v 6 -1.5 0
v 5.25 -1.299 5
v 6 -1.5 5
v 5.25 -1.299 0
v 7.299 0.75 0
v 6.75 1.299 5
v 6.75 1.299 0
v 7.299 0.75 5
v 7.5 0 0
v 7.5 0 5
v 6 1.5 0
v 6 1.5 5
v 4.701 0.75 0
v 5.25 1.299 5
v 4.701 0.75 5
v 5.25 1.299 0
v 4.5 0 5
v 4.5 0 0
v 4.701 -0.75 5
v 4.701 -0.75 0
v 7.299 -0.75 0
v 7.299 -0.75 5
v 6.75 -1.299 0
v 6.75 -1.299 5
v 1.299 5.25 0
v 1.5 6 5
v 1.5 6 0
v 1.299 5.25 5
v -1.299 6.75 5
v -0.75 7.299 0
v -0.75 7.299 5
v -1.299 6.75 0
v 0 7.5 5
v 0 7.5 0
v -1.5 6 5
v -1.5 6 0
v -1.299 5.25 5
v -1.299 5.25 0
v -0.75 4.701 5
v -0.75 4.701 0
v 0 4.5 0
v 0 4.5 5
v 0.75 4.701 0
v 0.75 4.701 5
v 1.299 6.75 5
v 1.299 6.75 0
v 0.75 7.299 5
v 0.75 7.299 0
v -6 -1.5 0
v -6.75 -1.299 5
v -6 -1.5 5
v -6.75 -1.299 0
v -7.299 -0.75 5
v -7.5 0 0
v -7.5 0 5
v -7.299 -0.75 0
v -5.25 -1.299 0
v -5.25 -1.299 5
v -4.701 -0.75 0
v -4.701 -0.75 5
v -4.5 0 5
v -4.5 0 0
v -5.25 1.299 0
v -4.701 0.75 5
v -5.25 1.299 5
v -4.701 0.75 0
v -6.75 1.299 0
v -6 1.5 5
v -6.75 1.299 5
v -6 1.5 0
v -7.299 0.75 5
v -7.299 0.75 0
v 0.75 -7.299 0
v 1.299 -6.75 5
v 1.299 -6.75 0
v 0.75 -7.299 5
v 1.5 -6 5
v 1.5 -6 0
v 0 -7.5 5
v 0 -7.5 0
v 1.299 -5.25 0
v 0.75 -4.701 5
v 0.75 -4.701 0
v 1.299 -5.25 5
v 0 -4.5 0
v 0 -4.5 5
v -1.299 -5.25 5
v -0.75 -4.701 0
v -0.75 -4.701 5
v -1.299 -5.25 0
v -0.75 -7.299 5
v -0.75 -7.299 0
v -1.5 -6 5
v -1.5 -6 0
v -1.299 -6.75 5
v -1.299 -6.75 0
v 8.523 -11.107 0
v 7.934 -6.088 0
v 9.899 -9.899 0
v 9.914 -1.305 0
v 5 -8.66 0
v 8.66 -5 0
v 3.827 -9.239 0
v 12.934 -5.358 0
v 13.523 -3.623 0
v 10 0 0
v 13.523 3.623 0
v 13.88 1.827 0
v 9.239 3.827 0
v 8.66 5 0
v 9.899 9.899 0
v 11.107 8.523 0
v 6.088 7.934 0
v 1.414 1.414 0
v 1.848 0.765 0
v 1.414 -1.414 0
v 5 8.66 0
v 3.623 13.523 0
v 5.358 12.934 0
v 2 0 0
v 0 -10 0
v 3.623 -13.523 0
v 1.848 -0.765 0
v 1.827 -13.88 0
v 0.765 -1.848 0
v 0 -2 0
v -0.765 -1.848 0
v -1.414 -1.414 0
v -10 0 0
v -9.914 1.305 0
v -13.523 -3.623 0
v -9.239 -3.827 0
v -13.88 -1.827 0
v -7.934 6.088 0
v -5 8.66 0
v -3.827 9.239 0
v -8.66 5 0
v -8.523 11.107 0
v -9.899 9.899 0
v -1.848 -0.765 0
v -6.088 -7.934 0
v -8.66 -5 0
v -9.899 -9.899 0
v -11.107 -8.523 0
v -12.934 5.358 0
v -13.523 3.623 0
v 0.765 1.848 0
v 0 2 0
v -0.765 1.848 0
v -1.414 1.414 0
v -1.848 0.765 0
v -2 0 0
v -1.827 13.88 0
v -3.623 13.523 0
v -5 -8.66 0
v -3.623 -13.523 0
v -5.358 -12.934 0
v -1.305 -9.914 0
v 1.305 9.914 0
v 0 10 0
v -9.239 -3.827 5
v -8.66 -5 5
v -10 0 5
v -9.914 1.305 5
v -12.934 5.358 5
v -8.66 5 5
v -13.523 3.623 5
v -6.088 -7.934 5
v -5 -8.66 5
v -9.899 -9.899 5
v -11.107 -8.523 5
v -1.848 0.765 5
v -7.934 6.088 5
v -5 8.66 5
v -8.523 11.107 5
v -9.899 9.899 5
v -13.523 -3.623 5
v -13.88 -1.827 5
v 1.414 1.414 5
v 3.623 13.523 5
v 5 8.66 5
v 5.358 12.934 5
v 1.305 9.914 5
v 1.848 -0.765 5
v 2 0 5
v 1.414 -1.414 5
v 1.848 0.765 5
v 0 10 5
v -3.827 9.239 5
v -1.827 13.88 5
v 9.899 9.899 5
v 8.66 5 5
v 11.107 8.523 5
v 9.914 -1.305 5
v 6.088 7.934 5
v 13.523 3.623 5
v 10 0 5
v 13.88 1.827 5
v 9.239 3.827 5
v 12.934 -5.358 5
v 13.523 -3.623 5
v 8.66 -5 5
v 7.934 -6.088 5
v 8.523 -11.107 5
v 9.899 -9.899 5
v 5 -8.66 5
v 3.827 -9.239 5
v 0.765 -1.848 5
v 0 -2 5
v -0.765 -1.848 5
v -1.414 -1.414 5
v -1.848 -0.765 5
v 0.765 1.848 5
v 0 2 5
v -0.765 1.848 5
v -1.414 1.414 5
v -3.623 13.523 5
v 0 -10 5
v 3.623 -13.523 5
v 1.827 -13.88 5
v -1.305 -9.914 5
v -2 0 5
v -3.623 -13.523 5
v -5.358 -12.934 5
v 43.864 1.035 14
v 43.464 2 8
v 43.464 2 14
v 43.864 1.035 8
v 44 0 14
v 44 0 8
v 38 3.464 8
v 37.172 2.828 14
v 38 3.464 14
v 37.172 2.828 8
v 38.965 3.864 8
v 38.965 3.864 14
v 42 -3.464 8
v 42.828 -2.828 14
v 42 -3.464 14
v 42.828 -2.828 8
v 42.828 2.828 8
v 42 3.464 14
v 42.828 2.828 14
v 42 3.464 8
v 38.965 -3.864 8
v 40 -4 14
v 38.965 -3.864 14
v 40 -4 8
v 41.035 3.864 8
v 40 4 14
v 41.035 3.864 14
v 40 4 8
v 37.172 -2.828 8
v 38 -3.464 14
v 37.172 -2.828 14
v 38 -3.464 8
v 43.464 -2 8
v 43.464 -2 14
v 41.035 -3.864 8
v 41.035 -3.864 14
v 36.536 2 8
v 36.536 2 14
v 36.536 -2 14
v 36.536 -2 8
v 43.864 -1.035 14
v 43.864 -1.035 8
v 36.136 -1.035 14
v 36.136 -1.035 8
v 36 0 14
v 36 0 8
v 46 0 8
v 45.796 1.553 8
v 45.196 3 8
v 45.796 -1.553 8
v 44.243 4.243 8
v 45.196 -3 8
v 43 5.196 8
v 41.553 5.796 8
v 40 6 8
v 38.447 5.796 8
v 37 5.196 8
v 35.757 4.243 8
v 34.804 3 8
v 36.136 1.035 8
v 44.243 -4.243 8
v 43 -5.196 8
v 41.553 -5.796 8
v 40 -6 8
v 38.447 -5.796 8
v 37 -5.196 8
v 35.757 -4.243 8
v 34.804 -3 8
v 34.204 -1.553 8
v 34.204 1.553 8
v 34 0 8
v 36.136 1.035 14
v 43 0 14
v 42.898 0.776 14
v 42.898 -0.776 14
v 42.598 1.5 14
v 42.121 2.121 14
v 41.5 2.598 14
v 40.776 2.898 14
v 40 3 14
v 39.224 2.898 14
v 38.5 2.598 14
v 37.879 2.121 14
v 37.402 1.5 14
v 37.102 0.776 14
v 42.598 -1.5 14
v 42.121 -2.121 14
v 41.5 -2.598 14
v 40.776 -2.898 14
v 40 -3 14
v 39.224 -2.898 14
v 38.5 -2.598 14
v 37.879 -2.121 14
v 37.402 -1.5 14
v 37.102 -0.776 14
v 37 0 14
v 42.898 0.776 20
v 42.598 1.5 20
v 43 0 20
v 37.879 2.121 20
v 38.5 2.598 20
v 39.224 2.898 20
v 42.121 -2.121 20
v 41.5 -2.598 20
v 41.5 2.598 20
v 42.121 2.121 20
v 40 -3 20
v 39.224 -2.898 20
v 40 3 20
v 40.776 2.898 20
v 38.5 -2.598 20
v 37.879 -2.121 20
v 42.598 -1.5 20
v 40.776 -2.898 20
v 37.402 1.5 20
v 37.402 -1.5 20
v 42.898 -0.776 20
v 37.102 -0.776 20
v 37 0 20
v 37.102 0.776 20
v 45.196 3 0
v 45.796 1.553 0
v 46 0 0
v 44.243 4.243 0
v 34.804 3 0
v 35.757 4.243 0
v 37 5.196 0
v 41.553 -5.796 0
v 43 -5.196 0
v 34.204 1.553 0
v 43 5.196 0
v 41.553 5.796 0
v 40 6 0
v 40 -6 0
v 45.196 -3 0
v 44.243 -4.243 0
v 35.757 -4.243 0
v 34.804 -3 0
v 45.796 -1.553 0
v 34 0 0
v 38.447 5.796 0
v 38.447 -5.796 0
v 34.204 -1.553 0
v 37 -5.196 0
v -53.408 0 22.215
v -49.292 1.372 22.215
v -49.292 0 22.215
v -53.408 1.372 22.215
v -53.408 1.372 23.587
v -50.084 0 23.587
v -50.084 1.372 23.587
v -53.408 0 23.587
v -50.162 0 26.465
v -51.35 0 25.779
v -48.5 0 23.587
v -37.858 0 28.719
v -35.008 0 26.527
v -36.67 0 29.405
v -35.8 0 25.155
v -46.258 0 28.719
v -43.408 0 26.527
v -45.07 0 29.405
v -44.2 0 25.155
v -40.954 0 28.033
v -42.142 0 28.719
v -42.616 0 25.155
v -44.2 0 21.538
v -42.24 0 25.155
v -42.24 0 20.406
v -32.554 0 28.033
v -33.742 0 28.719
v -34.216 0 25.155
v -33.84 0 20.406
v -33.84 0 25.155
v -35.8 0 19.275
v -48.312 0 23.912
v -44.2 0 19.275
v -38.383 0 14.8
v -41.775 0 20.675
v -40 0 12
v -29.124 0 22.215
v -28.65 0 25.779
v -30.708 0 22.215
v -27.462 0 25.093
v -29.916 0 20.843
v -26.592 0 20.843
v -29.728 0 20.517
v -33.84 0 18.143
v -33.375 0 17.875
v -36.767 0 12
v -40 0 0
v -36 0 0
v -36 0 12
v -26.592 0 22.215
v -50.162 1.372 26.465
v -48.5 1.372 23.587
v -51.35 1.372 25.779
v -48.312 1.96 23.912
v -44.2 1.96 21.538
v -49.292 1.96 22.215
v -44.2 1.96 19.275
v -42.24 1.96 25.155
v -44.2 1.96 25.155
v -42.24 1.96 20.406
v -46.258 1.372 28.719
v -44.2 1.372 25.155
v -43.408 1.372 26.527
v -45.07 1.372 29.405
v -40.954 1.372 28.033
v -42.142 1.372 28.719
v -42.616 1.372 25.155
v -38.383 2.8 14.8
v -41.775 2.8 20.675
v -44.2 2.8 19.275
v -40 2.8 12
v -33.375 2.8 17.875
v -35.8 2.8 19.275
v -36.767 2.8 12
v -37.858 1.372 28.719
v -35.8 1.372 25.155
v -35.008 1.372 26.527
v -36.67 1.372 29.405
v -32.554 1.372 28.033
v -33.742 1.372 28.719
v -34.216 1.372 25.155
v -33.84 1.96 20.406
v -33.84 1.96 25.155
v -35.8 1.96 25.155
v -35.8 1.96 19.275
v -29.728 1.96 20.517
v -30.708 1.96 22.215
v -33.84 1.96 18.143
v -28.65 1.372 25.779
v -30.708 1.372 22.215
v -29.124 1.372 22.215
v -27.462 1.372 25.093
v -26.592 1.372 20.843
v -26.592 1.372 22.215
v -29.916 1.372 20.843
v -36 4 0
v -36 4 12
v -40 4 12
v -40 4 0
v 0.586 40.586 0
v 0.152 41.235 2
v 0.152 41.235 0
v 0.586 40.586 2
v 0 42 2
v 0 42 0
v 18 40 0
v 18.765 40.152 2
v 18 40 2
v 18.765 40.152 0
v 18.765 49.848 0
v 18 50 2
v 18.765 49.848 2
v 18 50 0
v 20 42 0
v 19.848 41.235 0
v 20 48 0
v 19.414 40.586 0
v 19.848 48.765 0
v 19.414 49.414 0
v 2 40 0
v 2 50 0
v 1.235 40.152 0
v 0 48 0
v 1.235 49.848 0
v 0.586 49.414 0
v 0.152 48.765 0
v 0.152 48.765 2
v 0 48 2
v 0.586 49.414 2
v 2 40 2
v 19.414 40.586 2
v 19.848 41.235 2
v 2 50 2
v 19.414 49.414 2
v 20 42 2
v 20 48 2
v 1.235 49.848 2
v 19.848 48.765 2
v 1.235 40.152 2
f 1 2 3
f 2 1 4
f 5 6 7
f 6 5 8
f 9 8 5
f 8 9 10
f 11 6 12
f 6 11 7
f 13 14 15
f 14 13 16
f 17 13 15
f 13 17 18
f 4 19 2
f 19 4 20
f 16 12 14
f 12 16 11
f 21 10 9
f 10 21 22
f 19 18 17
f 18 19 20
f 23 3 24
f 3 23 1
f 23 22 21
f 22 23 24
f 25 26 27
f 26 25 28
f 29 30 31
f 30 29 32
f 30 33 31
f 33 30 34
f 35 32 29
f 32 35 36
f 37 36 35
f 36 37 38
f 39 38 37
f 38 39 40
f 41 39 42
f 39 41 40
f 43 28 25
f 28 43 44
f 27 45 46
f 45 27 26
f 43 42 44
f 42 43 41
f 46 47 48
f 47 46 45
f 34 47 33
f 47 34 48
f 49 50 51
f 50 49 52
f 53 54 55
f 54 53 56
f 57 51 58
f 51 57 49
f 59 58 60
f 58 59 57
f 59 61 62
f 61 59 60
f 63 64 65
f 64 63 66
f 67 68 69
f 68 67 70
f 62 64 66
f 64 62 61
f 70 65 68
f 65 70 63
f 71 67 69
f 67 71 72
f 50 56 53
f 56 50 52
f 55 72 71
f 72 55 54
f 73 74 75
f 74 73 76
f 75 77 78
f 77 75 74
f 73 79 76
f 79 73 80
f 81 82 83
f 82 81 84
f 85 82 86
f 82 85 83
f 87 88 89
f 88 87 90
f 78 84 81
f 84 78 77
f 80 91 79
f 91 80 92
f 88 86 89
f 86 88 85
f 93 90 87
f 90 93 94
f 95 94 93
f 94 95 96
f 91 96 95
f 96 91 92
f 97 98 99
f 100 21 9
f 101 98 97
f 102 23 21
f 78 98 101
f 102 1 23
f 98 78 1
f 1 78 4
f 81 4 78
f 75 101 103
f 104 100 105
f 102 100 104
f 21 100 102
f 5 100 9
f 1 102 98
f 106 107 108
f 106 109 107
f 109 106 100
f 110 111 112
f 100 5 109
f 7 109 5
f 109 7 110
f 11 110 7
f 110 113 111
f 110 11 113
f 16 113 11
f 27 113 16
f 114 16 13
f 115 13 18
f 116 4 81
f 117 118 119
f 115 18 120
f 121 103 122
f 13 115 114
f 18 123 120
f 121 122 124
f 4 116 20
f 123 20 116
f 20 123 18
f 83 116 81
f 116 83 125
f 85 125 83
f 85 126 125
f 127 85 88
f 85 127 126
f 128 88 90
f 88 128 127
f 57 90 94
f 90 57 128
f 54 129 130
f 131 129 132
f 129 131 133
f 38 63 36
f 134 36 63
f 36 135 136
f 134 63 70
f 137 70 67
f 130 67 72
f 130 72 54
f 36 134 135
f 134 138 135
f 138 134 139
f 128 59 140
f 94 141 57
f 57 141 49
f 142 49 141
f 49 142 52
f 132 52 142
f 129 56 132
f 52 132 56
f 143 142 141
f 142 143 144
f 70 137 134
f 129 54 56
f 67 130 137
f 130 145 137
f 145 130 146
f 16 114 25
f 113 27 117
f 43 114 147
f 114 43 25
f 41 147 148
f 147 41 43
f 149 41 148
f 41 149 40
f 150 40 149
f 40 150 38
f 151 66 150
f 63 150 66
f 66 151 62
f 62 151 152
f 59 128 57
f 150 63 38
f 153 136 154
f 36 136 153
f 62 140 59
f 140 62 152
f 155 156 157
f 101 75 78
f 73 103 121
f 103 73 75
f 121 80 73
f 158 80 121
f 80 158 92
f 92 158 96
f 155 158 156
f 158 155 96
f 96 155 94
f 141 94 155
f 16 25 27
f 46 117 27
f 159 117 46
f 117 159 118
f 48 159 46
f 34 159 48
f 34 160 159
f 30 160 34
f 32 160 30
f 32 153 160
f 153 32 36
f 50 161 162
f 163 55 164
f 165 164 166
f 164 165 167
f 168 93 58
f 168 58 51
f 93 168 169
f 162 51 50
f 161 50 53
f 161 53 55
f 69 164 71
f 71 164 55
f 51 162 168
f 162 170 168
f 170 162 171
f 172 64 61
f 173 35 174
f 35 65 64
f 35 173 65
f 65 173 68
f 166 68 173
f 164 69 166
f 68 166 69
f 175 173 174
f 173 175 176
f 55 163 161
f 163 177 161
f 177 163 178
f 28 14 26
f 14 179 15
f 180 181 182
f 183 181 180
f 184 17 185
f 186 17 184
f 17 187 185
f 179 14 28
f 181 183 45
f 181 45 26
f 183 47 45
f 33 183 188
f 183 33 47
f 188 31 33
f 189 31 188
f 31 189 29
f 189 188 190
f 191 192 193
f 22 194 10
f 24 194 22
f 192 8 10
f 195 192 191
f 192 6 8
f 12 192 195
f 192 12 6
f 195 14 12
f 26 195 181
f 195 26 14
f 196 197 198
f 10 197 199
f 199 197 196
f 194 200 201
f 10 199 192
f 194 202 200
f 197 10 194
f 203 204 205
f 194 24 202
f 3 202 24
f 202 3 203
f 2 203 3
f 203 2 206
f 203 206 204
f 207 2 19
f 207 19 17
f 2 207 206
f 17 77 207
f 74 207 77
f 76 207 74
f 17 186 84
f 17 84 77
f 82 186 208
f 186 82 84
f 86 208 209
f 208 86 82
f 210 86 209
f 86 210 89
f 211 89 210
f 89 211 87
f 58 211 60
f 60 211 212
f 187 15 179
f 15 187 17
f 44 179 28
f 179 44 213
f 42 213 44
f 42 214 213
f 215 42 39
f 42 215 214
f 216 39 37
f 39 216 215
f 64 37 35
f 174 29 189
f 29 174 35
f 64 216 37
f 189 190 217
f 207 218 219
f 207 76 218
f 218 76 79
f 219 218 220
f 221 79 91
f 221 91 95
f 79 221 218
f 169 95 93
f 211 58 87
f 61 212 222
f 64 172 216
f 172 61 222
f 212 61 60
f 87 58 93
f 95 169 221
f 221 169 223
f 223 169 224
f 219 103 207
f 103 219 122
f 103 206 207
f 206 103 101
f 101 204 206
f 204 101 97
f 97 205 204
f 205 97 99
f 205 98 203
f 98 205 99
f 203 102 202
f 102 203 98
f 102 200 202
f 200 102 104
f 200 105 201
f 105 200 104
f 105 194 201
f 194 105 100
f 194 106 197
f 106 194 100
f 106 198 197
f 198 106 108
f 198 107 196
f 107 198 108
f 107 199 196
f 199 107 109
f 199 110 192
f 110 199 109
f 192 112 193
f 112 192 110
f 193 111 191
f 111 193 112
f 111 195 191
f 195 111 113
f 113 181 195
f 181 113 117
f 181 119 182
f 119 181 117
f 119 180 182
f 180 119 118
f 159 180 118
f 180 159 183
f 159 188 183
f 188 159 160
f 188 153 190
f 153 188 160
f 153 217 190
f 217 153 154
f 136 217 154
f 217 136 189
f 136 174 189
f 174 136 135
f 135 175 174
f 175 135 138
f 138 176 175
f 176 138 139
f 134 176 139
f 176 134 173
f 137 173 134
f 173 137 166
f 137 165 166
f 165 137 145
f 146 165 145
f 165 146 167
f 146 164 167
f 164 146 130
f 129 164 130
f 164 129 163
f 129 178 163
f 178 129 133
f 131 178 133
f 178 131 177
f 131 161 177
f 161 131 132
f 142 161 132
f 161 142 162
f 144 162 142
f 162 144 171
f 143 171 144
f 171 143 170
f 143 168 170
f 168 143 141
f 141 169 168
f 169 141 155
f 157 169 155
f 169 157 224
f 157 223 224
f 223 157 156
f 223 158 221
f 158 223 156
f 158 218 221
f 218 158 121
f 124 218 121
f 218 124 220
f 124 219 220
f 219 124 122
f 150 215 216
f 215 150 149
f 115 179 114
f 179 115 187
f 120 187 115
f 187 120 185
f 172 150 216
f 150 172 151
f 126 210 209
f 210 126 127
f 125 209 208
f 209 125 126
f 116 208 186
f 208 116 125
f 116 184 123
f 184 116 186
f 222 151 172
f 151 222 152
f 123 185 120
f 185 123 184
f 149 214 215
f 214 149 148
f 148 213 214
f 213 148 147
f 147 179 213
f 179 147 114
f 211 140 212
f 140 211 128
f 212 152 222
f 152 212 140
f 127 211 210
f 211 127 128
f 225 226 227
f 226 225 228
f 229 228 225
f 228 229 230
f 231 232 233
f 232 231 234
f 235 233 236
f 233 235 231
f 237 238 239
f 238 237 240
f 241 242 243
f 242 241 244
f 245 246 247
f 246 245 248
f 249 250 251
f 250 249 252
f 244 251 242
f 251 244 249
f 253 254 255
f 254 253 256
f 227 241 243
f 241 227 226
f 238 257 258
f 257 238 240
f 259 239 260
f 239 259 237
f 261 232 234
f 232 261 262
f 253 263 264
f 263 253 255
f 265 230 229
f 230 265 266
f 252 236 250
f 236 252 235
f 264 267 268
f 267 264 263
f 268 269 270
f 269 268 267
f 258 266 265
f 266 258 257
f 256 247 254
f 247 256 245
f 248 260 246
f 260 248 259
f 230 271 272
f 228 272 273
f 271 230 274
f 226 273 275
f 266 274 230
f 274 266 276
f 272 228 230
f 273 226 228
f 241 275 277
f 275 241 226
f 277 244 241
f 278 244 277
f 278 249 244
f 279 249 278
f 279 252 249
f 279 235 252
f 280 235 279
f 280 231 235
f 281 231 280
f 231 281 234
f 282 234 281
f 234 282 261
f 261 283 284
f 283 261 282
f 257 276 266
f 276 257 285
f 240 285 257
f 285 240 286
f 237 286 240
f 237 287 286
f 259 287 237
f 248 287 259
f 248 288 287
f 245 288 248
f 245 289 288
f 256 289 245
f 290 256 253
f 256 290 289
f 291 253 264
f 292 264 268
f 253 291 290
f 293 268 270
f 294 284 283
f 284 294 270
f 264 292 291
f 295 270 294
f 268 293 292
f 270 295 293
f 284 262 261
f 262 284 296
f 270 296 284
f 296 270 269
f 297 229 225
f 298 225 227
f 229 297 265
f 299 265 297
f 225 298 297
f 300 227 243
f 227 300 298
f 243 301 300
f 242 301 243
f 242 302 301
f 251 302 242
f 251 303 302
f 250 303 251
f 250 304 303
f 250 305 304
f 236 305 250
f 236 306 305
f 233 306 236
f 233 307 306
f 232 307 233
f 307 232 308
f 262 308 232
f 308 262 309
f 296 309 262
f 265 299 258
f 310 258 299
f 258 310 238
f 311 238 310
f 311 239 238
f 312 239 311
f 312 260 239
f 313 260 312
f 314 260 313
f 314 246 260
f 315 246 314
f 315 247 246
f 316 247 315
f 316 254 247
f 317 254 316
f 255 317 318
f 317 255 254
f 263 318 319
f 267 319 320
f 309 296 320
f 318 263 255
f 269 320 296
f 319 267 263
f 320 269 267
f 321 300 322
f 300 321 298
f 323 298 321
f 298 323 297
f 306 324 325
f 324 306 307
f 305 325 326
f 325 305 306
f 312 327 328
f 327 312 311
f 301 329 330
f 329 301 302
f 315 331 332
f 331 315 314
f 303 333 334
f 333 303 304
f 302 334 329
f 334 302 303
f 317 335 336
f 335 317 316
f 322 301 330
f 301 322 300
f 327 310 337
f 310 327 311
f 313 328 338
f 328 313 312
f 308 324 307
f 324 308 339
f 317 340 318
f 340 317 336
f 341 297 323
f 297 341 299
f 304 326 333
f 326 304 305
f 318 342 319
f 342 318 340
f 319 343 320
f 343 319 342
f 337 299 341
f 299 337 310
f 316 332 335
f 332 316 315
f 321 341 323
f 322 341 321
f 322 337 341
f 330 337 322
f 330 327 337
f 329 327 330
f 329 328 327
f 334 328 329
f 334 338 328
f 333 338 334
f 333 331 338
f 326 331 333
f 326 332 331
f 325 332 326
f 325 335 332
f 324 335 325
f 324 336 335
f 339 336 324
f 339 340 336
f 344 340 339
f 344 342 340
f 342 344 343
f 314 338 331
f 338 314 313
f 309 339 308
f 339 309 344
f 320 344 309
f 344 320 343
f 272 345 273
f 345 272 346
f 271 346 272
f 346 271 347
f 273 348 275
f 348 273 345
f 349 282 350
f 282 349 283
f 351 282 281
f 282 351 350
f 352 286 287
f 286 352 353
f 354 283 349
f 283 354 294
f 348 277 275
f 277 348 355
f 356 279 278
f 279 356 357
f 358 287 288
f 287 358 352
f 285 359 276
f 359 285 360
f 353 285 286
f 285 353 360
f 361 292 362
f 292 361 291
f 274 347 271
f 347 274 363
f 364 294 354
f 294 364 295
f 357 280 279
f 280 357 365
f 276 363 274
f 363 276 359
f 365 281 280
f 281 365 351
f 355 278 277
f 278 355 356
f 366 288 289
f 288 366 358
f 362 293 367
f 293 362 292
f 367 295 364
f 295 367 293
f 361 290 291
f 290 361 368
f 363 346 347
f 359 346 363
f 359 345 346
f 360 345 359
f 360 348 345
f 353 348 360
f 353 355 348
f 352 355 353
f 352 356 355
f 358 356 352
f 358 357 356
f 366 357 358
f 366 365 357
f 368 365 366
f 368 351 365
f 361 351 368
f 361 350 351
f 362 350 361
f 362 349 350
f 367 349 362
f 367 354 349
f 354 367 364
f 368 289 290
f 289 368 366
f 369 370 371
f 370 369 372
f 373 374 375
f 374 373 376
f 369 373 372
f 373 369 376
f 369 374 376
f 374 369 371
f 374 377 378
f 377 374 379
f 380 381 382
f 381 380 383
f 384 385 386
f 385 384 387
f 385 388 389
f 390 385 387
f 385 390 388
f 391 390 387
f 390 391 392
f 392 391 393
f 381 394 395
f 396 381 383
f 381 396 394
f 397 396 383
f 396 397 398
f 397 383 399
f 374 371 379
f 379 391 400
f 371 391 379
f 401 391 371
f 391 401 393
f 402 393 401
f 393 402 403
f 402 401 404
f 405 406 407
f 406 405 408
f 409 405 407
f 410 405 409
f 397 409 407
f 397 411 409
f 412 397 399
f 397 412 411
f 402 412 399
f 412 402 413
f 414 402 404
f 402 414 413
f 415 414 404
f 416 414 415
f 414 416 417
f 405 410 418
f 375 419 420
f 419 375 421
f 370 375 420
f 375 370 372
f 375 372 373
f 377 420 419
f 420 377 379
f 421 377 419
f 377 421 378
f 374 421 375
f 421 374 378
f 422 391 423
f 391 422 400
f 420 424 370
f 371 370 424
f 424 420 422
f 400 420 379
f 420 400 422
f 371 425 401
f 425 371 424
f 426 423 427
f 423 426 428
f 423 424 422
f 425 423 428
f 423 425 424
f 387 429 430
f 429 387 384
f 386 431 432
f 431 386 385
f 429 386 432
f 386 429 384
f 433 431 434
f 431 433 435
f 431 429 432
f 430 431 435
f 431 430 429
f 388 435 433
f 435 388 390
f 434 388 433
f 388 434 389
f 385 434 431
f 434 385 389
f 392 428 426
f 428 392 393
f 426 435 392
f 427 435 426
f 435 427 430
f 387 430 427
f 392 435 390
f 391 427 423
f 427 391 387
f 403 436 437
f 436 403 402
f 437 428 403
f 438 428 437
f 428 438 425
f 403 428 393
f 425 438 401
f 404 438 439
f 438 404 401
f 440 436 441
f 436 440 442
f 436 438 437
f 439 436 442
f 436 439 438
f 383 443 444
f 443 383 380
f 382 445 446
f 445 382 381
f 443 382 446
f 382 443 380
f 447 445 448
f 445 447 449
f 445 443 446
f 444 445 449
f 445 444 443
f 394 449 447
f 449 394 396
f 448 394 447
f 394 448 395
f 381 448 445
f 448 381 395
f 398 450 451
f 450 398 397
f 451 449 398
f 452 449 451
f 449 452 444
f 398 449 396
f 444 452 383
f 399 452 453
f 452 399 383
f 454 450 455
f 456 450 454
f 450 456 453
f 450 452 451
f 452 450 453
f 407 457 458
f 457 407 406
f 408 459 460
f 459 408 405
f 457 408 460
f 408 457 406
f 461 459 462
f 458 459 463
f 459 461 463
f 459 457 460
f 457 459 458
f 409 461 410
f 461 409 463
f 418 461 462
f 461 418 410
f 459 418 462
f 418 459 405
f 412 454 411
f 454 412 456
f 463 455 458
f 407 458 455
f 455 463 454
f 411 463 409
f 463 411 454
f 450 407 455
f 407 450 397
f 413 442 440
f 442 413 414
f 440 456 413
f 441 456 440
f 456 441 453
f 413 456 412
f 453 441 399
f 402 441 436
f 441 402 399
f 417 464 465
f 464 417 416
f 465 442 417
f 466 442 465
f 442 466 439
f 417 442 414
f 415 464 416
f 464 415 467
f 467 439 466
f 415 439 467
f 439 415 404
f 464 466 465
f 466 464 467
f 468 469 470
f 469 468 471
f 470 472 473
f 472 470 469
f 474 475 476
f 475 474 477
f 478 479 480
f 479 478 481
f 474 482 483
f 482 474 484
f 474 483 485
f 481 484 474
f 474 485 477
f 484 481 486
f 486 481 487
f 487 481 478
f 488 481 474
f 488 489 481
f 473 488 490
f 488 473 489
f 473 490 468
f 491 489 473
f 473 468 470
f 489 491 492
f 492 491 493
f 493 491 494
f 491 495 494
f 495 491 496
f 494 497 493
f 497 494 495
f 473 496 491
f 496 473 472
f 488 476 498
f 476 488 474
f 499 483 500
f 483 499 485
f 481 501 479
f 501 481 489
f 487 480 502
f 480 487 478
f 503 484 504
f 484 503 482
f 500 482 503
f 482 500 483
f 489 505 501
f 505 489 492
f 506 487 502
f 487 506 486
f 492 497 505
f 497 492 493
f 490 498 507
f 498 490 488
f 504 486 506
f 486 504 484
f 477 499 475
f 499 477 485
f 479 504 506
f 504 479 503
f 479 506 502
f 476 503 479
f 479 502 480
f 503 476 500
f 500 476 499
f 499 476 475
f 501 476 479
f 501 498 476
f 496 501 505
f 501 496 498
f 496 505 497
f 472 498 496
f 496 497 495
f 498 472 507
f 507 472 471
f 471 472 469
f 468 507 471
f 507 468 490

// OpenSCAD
// file: lib/shapes.scad
// Shapes for modules.scad, brought in by `use`: only its modules and
// functions count, not what it makes itself.

corner_fn = 16;

module rounded_plate(size, r) {
    linear_extrude(height = size.z)
        offset_square([size.x, size.y], r);
}

module offset_square(size, r) {
    hull() for (x = [r, size.x - r], y = [r, size.y - r]) translate([x, y]) circle(r, $fn = corner_fn);
}

// Made when the file is opened alone, not when used.
rounded_plate([100, 100, 100], 5);
// main file
// Modules that pass children along, recursion and list comprehensions:
// a gear-like wheel on a stepped shaft, and a small tree of branches.

use <lib/shapes.scad>

teeth = 12; // [6:40]
module_size = 2;
shaft = [[0, 6], [8, 4], [14, 3]]; // [z, radius] steps

function pitch_radius(n, m) = n * m / 2;
function tooth_points(n, r, h) = [
    for (i = [0:n - 1], k = [0:3])
        let (a = 360 * (i + k / 4) / n, rr = (k == 1 || k == 2) ? r + h : r - h)
            [rr * cos(a), rr * sin(a)]
];

module arrayed(n, radius) {
    for (i = [0:n - 1]) rotate([0, 0, i * 360 / n]) translate([radius, 0, 0]) children();
}

module stepped(steps, i = 0) {
    if (i < len(steps)) {
        z0 = steps[i][0];
        z1 = i + 1 < len(steps) ? steps[i + 1][0] : z0 + 6;
        translate([0, 0, z0]) cylinder(r = steps[i][1], h = z1 - z0, $fn = 24);
        stepped(steps, i + 1);
    }
}

module branch(depth, size) {
    cube([size, size, size * 3]);
    if (depth > 0)
        translate([0, 0, size * 3])
            for (side = [-1, 1])
                rotate([0, side * 30, 0]) branch(depth - 1, size * 0.7);
}

r = pitch_radius(teeth, module_size);
difference() {
    linear_extrude(height = 5) polygon(tooth_points(teeth, r, module_size));
    translate([0, 0, -1]) cylinder(r = 2, h = 7, $fn = 16);
    arrayed(4, r / 2) cylinder(r = 1.5, h = 20, center = true, $fn = 12);
}
translate([40, 0, 0]) stepped(shaft);
translate([-40, 0, 0]) branch(3, 4);
translate([0, 40, 0]) rounded_plate([20, 10, 2], 2);

echo(teeth = teeth, r = r, points = len(tooth_points(teeth, r, module_size)));
